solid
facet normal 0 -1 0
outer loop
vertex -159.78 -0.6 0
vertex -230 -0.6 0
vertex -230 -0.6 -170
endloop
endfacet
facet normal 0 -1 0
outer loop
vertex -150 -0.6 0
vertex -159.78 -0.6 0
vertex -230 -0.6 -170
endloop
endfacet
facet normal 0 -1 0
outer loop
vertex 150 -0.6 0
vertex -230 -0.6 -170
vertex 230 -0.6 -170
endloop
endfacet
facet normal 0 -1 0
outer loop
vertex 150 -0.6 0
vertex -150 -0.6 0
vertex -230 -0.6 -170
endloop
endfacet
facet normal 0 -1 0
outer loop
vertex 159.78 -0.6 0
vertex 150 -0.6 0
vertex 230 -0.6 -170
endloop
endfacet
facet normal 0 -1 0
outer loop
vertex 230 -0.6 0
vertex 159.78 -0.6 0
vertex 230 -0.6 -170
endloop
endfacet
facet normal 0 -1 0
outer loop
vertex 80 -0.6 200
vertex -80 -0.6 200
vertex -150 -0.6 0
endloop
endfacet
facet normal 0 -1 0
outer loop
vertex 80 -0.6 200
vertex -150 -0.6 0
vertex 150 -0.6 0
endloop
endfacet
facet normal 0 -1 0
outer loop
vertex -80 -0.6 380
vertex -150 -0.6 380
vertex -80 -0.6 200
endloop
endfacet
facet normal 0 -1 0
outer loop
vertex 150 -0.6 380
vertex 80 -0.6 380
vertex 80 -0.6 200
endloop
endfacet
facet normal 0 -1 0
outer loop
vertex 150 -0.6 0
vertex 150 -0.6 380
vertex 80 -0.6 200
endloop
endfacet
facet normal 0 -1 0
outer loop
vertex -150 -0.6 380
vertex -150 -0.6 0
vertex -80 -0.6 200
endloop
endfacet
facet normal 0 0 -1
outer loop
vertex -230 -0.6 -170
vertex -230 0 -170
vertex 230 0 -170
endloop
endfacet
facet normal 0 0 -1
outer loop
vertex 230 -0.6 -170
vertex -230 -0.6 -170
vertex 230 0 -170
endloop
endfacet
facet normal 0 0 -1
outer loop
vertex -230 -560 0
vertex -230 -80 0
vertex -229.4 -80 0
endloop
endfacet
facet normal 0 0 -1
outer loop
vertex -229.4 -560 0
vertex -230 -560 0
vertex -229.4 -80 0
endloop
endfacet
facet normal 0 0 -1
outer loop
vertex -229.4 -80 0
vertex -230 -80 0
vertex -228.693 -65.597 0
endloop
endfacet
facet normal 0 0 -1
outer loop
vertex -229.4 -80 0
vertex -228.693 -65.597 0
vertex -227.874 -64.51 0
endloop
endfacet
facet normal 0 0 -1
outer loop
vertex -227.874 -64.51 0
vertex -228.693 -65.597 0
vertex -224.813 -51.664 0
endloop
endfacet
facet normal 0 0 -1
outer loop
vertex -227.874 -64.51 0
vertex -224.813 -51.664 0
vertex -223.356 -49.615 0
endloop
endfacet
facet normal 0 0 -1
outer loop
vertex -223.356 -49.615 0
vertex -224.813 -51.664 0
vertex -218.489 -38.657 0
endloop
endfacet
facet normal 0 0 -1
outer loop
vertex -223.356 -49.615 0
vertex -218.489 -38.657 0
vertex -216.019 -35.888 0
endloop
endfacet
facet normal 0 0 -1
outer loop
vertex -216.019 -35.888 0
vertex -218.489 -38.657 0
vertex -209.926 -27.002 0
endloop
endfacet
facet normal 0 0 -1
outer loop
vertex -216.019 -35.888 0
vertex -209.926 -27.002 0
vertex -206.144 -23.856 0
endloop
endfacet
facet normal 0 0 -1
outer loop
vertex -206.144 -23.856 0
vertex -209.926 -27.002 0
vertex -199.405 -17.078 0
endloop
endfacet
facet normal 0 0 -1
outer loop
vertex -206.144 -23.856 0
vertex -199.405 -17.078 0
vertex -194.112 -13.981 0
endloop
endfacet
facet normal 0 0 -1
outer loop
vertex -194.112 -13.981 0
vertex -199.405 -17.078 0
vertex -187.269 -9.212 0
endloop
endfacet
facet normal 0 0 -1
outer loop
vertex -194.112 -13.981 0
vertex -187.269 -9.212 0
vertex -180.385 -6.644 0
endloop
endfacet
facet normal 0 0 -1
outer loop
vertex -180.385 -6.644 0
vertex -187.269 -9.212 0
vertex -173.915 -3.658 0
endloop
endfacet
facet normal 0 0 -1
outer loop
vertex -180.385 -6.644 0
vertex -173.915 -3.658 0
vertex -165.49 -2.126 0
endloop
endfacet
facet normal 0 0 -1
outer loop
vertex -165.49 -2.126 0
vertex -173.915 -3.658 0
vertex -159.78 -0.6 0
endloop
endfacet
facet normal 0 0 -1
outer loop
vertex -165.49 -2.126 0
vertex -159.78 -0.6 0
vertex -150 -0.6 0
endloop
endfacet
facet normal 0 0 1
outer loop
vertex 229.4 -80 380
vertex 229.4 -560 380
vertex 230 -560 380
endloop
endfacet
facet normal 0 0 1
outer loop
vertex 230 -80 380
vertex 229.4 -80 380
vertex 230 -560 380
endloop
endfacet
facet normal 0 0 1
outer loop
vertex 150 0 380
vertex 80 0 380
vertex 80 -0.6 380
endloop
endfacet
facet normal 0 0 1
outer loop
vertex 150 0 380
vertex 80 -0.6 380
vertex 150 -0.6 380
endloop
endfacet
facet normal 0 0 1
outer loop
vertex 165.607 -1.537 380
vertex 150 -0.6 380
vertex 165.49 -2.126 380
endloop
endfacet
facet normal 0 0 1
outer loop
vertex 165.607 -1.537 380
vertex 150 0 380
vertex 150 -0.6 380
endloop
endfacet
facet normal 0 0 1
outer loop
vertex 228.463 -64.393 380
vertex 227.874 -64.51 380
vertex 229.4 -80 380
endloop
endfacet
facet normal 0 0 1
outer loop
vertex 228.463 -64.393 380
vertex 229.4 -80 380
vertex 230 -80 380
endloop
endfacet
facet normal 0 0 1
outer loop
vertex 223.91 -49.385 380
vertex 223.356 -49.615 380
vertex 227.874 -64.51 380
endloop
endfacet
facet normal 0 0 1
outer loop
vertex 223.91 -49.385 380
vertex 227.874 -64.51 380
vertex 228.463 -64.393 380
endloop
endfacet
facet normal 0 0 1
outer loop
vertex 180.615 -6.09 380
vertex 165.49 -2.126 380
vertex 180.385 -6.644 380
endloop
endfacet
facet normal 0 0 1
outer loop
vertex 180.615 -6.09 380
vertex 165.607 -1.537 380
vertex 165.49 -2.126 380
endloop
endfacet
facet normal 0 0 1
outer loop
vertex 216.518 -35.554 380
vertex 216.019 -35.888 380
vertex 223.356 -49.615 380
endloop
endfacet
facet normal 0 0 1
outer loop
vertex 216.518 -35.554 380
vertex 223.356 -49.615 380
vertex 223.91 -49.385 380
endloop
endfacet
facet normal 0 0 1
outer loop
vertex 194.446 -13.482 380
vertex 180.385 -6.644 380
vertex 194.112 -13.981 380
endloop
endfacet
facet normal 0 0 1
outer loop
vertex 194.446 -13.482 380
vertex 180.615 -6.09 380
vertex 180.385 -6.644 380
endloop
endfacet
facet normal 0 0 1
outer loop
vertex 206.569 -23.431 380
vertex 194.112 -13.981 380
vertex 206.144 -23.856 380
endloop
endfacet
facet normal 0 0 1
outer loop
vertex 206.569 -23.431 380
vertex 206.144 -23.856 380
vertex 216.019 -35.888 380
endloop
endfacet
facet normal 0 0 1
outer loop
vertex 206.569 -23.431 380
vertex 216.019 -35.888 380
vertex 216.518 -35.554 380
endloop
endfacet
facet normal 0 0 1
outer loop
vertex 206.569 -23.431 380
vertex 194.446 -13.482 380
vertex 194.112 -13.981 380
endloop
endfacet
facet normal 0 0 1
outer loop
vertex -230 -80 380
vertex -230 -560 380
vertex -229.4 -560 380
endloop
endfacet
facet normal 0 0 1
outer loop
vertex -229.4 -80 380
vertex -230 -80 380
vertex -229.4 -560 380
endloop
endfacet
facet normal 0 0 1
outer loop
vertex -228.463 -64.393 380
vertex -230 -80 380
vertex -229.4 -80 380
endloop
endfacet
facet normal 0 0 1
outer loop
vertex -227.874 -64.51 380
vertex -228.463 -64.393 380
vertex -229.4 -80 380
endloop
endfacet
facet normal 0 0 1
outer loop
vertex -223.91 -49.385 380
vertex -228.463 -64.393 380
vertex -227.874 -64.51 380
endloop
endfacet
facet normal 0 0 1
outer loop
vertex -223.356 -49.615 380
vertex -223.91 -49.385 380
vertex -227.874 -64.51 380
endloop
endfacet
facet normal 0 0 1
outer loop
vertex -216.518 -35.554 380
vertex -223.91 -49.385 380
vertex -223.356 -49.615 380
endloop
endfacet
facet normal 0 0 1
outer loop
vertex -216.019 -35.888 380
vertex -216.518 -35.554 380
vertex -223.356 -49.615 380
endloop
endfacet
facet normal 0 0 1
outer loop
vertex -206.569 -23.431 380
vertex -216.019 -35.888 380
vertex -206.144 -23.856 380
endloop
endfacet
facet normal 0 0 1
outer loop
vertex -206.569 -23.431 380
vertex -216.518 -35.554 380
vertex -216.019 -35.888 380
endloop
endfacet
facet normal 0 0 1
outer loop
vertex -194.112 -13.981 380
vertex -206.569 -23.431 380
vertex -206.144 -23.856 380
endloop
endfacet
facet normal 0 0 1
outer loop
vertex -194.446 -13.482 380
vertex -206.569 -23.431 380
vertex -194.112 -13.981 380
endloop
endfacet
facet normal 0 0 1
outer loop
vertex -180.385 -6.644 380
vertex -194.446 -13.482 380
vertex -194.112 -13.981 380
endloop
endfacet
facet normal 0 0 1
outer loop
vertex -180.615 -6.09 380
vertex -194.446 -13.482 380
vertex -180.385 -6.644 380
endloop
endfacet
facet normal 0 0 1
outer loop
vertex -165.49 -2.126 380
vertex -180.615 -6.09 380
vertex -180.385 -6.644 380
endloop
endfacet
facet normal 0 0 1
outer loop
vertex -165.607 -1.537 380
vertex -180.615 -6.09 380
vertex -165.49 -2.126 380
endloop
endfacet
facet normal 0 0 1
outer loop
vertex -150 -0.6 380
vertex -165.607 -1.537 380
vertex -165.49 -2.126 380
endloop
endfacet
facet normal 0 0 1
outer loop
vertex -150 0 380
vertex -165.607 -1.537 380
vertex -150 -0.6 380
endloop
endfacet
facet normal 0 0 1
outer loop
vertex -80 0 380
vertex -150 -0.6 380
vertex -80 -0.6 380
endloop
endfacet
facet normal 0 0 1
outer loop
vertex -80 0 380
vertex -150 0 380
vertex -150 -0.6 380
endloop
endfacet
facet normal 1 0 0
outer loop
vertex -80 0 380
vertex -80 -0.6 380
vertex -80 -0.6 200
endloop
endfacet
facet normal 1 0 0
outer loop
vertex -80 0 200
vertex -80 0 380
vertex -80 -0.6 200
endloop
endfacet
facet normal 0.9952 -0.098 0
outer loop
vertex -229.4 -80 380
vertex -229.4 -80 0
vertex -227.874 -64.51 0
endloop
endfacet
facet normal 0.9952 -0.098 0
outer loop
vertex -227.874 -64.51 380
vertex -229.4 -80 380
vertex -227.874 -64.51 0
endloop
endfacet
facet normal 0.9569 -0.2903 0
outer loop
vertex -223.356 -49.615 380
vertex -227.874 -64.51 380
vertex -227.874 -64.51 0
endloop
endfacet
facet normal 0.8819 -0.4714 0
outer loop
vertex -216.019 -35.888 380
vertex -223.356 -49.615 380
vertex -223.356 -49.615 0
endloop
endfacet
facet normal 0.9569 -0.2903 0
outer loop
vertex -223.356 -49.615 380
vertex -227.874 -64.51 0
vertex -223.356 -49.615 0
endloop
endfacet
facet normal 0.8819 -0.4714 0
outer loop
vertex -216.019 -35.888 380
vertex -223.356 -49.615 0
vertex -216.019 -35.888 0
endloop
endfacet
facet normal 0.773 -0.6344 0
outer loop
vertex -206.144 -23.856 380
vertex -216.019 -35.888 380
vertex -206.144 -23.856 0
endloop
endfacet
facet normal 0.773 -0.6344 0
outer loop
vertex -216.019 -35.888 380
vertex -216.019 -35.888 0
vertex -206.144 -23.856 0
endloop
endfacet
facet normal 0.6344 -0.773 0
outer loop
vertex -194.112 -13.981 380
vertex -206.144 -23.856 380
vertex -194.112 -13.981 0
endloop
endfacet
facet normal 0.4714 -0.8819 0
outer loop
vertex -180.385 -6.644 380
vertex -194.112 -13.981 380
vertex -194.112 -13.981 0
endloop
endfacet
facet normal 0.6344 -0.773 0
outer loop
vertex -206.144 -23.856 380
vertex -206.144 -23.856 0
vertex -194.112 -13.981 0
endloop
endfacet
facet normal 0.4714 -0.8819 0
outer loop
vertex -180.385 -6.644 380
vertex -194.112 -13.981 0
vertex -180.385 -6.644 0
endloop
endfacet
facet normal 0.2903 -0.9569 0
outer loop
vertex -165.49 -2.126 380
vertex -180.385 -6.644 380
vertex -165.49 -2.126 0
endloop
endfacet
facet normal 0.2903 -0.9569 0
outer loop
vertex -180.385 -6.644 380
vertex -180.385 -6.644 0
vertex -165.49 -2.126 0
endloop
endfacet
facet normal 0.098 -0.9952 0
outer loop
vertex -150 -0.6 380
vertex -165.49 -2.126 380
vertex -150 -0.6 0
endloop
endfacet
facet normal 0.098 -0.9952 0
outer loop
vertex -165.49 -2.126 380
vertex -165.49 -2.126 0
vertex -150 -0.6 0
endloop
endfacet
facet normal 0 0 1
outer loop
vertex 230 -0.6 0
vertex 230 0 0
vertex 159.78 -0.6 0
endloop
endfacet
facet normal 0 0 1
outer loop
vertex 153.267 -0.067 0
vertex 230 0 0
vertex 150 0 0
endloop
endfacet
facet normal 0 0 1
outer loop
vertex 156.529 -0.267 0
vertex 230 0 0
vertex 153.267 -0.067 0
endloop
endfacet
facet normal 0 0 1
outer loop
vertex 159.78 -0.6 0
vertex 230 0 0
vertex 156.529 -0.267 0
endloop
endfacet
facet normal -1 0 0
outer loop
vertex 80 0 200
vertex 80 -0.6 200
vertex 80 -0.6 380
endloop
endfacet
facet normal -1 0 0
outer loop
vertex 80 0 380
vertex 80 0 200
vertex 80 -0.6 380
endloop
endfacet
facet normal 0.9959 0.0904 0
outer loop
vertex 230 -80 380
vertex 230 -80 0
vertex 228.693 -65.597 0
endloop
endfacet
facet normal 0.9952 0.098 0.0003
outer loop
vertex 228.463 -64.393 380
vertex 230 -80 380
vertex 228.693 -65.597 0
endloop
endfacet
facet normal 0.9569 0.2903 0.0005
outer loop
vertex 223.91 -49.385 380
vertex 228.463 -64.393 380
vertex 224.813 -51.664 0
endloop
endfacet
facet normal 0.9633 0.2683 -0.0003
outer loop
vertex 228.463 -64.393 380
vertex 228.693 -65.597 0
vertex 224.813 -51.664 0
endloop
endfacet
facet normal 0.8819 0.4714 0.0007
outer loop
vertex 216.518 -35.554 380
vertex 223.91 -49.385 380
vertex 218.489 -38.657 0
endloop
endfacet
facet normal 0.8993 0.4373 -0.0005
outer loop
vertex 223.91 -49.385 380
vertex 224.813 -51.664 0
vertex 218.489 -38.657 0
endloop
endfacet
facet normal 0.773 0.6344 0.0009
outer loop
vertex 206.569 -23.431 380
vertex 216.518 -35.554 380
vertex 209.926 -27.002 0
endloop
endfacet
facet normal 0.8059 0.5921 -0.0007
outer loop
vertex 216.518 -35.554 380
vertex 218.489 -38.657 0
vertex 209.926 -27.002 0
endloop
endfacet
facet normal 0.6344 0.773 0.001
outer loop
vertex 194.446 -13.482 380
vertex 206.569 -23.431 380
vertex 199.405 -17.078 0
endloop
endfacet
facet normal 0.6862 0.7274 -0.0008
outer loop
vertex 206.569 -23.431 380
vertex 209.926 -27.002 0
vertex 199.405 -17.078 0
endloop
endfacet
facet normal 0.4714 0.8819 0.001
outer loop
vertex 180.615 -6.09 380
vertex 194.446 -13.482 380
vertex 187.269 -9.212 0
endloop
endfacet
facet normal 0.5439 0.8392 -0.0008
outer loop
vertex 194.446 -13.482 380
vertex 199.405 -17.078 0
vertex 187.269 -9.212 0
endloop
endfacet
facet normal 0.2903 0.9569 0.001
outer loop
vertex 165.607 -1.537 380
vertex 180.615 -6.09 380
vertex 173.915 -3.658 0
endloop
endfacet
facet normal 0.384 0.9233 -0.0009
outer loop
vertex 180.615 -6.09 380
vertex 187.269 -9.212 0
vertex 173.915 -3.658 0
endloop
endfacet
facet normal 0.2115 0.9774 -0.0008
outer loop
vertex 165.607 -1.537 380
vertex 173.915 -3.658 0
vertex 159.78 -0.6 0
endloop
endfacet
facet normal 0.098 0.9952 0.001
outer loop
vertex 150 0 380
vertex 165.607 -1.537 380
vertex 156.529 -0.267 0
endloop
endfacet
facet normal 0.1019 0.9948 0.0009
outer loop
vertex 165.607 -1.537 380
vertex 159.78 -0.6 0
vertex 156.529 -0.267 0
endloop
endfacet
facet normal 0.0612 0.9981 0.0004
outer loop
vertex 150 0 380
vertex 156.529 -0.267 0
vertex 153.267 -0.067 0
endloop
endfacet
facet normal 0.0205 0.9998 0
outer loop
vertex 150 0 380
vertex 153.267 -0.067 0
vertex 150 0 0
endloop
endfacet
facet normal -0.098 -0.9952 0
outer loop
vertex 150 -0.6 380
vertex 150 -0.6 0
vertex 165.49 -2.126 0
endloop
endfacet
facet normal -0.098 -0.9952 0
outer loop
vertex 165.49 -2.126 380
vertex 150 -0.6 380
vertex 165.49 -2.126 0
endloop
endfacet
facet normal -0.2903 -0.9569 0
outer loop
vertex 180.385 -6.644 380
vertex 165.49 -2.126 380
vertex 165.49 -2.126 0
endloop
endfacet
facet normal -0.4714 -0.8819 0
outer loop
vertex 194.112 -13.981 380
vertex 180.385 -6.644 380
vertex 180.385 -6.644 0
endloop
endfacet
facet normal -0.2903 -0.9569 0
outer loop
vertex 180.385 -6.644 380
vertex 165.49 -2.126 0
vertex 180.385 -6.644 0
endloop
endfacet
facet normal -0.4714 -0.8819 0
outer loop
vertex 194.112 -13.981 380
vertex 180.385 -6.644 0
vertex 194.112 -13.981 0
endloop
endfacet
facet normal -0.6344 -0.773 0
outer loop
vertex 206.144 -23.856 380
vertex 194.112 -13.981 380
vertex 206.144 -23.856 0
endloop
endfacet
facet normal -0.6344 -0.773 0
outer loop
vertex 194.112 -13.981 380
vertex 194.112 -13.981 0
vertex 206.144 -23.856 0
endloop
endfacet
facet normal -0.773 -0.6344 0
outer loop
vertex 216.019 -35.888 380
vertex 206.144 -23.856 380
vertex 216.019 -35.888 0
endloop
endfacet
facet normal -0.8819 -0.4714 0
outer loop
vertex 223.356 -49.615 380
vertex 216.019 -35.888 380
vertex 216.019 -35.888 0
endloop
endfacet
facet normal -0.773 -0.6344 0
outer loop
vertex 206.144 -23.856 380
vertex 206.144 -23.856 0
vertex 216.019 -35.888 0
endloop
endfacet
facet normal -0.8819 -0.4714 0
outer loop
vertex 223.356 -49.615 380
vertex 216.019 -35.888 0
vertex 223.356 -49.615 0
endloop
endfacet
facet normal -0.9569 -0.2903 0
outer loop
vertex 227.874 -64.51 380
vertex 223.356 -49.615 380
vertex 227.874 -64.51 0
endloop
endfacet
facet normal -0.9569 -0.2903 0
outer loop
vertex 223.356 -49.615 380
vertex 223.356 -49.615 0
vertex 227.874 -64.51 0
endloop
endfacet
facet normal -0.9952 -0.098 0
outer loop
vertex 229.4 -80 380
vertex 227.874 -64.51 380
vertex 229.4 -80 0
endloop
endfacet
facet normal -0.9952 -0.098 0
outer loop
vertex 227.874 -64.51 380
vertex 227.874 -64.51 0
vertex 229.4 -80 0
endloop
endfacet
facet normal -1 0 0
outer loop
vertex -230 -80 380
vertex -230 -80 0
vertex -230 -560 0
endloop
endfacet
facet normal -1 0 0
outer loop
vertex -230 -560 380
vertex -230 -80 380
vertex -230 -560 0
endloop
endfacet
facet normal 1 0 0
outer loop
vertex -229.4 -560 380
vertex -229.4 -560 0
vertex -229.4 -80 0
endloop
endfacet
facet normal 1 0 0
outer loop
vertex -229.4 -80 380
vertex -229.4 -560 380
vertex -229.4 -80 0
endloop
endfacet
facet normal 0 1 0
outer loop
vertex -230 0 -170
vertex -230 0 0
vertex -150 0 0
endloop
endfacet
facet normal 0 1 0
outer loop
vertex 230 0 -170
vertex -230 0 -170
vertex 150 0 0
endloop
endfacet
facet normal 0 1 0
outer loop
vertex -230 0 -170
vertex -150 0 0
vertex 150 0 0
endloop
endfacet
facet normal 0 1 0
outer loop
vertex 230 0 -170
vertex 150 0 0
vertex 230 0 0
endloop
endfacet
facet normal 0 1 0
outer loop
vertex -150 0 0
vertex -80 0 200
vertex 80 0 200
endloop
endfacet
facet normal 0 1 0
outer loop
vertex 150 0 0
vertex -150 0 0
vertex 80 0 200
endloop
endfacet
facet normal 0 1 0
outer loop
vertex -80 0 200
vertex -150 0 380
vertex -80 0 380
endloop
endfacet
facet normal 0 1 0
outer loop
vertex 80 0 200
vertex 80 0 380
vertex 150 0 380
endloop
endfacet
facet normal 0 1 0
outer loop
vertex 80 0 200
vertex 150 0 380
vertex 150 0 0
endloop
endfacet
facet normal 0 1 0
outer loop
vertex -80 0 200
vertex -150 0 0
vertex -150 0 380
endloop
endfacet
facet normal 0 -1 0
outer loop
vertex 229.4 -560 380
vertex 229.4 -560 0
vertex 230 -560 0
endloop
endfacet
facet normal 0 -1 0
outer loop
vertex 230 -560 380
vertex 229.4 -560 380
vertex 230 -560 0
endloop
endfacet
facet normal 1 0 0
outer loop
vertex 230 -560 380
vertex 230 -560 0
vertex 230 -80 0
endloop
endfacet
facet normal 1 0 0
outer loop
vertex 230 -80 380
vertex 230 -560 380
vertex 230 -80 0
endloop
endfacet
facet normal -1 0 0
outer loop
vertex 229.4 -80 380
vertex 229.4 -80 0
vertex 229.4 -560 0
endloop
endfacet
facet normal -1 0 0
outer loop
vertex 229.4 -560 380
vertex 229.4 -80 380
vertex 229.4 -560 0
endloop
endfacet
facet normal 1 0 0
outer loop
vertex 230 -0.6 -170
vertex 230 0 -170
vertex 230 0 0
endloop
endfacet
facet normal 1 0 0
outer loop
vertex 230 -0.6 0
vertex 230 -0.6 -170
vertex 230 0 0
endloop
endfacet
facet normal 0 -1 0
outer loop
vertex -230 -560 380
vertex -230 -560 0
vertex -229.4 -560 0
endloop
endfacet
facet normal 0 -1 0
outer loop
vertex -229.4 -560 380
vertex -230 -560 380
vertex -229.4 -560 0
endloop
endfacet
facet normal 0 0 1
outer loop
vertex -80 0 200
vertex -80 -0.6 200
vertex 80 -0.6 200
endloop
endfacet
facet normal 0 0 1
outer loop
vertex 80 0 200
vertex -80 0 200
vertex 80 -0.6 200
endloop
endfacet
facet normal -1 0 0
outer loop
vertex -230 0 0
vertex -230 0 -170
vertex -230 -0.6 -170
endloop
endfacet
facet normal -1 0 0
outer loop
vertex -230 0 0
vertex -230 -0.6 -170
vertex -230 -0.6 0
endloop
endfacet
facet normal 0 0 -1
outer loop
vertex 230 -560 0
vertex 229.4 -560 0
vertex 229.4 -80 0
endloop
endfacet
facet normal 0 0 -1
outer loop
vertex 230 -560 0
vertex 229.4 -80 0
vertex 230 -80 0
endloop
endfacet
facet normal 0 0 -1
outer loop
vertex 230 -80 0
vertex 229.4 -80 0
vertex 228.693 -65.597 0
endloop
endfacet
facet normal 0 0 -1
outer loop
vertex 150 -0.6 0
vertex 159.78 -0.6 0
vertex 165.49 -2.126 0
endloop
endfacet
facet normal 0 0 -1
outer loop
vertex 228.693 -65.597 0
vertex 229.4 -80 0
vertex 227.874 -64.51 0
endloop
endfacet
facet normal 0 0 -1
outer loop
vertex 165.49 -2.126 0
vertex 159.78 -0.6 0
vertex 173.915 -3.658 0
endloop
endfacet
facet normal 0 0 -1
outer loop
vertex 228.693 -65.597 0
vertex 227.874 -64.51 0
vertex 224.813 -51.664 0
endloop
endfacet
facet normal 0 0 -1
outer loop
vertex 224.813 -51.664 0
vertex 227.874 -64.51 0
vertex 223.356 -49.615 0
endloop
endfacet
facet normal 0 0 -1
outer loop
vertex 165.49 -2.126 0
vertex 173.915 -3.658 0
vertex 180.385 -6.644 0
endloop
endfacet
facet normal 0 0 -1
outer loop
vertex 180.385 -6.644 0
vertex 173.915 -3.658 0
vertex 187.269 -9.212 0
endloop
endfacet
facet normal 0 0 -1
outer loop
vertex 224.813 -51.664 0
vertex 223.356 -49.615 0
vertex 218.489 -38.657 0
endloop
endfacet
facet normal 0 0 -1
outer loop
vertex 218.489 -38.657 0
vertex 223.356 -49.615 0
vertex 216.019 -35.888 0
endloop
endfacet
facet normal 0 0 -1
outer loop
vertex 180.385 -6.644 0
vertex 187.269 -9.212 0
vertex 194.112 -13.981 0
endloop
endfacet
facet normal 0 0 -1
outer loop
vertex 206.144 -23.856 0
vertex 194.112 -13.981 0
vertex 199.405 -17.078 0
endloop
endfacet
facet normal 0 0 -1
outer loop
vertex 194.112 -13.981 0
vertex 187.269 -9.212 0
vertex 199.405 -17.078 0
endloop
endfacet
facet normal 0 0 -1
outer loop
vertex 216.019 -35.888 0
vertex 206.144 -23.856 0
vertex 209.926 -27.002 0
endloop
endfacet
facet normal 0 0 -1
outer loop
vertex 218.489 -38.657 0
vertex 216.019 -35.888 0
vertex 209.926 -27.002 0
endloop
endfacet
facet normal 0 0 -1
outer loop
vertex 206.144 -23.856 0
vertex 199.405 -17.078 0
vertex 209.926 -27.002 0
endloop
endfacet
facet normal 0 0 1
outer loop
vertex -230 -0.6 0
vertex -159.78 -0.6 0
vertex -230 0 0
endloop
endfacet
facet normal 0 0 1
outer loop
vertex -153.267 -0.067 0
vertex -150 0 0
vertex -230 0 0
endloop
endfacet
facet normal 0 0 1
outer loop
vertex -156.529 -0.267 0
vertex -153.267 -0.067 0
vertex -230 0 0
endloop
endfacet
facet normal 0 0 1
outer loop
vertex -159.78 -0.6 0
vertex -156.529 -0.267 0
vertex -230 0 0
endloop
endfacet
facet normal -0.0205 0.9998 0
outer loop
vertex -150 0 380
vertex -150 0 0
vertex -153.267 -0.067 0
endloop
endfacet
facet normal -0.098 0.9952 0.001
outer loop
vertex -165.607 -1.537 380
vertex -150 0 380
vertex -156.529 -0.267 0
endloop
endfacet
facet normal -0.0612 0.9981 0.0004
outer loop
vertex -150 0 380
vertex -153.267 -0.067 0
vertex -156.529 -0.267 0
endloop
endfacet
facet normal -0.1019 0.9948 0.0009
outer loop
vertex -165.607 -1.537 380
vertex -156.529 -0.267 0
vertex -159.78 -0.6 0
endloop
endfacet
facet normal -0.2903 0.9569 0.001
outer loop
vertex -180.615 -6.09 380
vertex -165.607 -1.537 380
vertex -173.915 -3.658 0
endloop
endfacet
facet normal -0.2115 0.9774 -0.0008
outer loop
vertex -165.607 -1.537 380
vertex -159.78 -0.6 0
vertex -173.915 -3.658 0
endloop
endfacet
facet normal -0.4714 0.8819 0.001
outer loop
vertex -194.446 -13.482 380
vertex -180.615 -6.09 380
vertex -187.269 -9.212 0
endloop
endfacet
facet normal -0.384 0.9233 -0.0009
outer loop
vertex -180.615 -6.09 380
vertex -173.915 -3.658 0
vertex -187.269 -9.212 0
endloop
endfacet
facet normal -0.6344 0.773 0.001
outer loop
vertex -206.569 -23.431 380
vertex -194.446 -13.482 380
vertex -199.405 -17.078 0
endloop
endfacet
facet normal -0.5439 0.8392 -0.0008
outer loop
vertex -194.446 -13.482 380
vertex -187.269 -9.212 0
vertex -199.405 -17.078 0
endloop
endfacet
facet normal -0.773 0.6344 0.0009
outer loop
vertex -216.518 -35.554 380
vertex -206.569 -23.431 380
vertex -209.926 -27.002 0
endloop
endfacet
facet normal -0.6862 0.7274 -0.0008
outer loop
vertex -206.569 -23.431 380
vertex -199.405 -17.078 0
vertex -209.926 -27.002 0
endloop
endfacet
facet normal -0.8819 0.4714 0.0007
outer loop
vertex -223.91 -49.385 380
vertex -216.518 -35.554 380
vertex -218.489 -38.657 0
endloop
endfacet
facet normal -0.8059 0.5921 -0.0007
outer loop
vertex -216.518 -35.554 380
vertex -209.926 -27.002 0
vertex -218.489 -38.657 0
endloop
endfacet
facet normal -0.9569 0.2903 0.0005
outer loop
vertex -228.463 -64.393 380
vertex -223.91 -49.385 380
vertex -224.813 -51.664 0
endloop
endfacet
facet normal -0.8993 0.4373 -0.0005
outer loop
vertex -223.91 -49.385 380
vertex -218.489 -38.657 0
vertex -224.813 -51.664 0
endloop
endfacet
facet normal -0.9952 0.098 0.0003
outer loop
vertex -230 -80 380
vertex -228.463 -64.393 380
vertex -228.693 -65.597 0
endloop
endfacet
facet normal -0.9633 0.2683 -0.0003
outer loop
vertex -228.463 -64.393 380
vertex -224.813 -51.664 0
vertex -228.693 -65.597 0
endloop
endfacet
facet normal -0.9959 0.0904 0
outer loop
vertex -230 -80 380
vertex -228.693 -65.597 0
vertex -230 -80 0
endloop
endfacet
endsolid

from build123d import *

# Parameters (mm, degrees)
F1_DEPTH = 380
F2_W     = 80
F2_H     = 180
F2_H_2   = 115.651754
F3_DEPTH = 25.4
F4_W     = 230
F4_H     = 170
F5_DEPTH = 0.6


with BuildPart() as f1:
    # F0 (on Top) → F1 (new body)
    with BuildSketch(Plane.XY):
        with BuildLine():
            Line((150, 0), (0, 0))
            Line((0, 0), (-150, 0))
            ThreePointArc((-150, 0), (-206.568542, -23.431458), (-230, -80))
            Line((-230, -80), (-230, -560))
            Line((-230, -560), (-229.4, -560))
            Line((-229.4, -560), (-229.4, -80))
            ThreePointArc((-229.4, -80), (-206.144278, -23.855722), (-150, -0.6))
            Line((-150, -0.6), (0, -0.6))
            Line((0, -0.6), (150, -0.6))
            ThreePointArc((150, -0.6), (206.144278, -23.855722), (229.4, -80))
            Line((229.4, -80), (229.4, -560))
            Line((229.4, -560), (230, -560))
            Line((230, -560), (230, -80))
            ThreePointArc((230, -80), (206.568542, -23.431458), (150, 0))
        make_face()
    extrude(amount=F1_DEPTH)

    # F2 (on face) → F3 (cut)
    with BuildSketch(Plane.XZ.offset(0.6)):
        with Locations((-40, 290)):
            Rectangle(F2_W, F2_H)
        with Locations((40, 290)):
            Rectangle(F2_W, F2_H)
        with Locations((40, 437.825877)):
            Rectangle(F2_W, F2_H_2)
        with Locations((-40, 437.825877)):
            Rectangle(F2_W, F2_H_2)
    extrude(amount=-F3_DEPTH, mode=Mode.SUBTRACT)

    # F4 (on Front) → F5 (join)
    with BuildSketch(Plane.XZ):
        with Locations((115, -85)):
            Rectangle(F4_W, F4_H)
        with Locations((-115, -85)):
            Rectangle(F4_W, F4_H)
    extrude(amount=F5_DEPTH)


solid = f1.part
